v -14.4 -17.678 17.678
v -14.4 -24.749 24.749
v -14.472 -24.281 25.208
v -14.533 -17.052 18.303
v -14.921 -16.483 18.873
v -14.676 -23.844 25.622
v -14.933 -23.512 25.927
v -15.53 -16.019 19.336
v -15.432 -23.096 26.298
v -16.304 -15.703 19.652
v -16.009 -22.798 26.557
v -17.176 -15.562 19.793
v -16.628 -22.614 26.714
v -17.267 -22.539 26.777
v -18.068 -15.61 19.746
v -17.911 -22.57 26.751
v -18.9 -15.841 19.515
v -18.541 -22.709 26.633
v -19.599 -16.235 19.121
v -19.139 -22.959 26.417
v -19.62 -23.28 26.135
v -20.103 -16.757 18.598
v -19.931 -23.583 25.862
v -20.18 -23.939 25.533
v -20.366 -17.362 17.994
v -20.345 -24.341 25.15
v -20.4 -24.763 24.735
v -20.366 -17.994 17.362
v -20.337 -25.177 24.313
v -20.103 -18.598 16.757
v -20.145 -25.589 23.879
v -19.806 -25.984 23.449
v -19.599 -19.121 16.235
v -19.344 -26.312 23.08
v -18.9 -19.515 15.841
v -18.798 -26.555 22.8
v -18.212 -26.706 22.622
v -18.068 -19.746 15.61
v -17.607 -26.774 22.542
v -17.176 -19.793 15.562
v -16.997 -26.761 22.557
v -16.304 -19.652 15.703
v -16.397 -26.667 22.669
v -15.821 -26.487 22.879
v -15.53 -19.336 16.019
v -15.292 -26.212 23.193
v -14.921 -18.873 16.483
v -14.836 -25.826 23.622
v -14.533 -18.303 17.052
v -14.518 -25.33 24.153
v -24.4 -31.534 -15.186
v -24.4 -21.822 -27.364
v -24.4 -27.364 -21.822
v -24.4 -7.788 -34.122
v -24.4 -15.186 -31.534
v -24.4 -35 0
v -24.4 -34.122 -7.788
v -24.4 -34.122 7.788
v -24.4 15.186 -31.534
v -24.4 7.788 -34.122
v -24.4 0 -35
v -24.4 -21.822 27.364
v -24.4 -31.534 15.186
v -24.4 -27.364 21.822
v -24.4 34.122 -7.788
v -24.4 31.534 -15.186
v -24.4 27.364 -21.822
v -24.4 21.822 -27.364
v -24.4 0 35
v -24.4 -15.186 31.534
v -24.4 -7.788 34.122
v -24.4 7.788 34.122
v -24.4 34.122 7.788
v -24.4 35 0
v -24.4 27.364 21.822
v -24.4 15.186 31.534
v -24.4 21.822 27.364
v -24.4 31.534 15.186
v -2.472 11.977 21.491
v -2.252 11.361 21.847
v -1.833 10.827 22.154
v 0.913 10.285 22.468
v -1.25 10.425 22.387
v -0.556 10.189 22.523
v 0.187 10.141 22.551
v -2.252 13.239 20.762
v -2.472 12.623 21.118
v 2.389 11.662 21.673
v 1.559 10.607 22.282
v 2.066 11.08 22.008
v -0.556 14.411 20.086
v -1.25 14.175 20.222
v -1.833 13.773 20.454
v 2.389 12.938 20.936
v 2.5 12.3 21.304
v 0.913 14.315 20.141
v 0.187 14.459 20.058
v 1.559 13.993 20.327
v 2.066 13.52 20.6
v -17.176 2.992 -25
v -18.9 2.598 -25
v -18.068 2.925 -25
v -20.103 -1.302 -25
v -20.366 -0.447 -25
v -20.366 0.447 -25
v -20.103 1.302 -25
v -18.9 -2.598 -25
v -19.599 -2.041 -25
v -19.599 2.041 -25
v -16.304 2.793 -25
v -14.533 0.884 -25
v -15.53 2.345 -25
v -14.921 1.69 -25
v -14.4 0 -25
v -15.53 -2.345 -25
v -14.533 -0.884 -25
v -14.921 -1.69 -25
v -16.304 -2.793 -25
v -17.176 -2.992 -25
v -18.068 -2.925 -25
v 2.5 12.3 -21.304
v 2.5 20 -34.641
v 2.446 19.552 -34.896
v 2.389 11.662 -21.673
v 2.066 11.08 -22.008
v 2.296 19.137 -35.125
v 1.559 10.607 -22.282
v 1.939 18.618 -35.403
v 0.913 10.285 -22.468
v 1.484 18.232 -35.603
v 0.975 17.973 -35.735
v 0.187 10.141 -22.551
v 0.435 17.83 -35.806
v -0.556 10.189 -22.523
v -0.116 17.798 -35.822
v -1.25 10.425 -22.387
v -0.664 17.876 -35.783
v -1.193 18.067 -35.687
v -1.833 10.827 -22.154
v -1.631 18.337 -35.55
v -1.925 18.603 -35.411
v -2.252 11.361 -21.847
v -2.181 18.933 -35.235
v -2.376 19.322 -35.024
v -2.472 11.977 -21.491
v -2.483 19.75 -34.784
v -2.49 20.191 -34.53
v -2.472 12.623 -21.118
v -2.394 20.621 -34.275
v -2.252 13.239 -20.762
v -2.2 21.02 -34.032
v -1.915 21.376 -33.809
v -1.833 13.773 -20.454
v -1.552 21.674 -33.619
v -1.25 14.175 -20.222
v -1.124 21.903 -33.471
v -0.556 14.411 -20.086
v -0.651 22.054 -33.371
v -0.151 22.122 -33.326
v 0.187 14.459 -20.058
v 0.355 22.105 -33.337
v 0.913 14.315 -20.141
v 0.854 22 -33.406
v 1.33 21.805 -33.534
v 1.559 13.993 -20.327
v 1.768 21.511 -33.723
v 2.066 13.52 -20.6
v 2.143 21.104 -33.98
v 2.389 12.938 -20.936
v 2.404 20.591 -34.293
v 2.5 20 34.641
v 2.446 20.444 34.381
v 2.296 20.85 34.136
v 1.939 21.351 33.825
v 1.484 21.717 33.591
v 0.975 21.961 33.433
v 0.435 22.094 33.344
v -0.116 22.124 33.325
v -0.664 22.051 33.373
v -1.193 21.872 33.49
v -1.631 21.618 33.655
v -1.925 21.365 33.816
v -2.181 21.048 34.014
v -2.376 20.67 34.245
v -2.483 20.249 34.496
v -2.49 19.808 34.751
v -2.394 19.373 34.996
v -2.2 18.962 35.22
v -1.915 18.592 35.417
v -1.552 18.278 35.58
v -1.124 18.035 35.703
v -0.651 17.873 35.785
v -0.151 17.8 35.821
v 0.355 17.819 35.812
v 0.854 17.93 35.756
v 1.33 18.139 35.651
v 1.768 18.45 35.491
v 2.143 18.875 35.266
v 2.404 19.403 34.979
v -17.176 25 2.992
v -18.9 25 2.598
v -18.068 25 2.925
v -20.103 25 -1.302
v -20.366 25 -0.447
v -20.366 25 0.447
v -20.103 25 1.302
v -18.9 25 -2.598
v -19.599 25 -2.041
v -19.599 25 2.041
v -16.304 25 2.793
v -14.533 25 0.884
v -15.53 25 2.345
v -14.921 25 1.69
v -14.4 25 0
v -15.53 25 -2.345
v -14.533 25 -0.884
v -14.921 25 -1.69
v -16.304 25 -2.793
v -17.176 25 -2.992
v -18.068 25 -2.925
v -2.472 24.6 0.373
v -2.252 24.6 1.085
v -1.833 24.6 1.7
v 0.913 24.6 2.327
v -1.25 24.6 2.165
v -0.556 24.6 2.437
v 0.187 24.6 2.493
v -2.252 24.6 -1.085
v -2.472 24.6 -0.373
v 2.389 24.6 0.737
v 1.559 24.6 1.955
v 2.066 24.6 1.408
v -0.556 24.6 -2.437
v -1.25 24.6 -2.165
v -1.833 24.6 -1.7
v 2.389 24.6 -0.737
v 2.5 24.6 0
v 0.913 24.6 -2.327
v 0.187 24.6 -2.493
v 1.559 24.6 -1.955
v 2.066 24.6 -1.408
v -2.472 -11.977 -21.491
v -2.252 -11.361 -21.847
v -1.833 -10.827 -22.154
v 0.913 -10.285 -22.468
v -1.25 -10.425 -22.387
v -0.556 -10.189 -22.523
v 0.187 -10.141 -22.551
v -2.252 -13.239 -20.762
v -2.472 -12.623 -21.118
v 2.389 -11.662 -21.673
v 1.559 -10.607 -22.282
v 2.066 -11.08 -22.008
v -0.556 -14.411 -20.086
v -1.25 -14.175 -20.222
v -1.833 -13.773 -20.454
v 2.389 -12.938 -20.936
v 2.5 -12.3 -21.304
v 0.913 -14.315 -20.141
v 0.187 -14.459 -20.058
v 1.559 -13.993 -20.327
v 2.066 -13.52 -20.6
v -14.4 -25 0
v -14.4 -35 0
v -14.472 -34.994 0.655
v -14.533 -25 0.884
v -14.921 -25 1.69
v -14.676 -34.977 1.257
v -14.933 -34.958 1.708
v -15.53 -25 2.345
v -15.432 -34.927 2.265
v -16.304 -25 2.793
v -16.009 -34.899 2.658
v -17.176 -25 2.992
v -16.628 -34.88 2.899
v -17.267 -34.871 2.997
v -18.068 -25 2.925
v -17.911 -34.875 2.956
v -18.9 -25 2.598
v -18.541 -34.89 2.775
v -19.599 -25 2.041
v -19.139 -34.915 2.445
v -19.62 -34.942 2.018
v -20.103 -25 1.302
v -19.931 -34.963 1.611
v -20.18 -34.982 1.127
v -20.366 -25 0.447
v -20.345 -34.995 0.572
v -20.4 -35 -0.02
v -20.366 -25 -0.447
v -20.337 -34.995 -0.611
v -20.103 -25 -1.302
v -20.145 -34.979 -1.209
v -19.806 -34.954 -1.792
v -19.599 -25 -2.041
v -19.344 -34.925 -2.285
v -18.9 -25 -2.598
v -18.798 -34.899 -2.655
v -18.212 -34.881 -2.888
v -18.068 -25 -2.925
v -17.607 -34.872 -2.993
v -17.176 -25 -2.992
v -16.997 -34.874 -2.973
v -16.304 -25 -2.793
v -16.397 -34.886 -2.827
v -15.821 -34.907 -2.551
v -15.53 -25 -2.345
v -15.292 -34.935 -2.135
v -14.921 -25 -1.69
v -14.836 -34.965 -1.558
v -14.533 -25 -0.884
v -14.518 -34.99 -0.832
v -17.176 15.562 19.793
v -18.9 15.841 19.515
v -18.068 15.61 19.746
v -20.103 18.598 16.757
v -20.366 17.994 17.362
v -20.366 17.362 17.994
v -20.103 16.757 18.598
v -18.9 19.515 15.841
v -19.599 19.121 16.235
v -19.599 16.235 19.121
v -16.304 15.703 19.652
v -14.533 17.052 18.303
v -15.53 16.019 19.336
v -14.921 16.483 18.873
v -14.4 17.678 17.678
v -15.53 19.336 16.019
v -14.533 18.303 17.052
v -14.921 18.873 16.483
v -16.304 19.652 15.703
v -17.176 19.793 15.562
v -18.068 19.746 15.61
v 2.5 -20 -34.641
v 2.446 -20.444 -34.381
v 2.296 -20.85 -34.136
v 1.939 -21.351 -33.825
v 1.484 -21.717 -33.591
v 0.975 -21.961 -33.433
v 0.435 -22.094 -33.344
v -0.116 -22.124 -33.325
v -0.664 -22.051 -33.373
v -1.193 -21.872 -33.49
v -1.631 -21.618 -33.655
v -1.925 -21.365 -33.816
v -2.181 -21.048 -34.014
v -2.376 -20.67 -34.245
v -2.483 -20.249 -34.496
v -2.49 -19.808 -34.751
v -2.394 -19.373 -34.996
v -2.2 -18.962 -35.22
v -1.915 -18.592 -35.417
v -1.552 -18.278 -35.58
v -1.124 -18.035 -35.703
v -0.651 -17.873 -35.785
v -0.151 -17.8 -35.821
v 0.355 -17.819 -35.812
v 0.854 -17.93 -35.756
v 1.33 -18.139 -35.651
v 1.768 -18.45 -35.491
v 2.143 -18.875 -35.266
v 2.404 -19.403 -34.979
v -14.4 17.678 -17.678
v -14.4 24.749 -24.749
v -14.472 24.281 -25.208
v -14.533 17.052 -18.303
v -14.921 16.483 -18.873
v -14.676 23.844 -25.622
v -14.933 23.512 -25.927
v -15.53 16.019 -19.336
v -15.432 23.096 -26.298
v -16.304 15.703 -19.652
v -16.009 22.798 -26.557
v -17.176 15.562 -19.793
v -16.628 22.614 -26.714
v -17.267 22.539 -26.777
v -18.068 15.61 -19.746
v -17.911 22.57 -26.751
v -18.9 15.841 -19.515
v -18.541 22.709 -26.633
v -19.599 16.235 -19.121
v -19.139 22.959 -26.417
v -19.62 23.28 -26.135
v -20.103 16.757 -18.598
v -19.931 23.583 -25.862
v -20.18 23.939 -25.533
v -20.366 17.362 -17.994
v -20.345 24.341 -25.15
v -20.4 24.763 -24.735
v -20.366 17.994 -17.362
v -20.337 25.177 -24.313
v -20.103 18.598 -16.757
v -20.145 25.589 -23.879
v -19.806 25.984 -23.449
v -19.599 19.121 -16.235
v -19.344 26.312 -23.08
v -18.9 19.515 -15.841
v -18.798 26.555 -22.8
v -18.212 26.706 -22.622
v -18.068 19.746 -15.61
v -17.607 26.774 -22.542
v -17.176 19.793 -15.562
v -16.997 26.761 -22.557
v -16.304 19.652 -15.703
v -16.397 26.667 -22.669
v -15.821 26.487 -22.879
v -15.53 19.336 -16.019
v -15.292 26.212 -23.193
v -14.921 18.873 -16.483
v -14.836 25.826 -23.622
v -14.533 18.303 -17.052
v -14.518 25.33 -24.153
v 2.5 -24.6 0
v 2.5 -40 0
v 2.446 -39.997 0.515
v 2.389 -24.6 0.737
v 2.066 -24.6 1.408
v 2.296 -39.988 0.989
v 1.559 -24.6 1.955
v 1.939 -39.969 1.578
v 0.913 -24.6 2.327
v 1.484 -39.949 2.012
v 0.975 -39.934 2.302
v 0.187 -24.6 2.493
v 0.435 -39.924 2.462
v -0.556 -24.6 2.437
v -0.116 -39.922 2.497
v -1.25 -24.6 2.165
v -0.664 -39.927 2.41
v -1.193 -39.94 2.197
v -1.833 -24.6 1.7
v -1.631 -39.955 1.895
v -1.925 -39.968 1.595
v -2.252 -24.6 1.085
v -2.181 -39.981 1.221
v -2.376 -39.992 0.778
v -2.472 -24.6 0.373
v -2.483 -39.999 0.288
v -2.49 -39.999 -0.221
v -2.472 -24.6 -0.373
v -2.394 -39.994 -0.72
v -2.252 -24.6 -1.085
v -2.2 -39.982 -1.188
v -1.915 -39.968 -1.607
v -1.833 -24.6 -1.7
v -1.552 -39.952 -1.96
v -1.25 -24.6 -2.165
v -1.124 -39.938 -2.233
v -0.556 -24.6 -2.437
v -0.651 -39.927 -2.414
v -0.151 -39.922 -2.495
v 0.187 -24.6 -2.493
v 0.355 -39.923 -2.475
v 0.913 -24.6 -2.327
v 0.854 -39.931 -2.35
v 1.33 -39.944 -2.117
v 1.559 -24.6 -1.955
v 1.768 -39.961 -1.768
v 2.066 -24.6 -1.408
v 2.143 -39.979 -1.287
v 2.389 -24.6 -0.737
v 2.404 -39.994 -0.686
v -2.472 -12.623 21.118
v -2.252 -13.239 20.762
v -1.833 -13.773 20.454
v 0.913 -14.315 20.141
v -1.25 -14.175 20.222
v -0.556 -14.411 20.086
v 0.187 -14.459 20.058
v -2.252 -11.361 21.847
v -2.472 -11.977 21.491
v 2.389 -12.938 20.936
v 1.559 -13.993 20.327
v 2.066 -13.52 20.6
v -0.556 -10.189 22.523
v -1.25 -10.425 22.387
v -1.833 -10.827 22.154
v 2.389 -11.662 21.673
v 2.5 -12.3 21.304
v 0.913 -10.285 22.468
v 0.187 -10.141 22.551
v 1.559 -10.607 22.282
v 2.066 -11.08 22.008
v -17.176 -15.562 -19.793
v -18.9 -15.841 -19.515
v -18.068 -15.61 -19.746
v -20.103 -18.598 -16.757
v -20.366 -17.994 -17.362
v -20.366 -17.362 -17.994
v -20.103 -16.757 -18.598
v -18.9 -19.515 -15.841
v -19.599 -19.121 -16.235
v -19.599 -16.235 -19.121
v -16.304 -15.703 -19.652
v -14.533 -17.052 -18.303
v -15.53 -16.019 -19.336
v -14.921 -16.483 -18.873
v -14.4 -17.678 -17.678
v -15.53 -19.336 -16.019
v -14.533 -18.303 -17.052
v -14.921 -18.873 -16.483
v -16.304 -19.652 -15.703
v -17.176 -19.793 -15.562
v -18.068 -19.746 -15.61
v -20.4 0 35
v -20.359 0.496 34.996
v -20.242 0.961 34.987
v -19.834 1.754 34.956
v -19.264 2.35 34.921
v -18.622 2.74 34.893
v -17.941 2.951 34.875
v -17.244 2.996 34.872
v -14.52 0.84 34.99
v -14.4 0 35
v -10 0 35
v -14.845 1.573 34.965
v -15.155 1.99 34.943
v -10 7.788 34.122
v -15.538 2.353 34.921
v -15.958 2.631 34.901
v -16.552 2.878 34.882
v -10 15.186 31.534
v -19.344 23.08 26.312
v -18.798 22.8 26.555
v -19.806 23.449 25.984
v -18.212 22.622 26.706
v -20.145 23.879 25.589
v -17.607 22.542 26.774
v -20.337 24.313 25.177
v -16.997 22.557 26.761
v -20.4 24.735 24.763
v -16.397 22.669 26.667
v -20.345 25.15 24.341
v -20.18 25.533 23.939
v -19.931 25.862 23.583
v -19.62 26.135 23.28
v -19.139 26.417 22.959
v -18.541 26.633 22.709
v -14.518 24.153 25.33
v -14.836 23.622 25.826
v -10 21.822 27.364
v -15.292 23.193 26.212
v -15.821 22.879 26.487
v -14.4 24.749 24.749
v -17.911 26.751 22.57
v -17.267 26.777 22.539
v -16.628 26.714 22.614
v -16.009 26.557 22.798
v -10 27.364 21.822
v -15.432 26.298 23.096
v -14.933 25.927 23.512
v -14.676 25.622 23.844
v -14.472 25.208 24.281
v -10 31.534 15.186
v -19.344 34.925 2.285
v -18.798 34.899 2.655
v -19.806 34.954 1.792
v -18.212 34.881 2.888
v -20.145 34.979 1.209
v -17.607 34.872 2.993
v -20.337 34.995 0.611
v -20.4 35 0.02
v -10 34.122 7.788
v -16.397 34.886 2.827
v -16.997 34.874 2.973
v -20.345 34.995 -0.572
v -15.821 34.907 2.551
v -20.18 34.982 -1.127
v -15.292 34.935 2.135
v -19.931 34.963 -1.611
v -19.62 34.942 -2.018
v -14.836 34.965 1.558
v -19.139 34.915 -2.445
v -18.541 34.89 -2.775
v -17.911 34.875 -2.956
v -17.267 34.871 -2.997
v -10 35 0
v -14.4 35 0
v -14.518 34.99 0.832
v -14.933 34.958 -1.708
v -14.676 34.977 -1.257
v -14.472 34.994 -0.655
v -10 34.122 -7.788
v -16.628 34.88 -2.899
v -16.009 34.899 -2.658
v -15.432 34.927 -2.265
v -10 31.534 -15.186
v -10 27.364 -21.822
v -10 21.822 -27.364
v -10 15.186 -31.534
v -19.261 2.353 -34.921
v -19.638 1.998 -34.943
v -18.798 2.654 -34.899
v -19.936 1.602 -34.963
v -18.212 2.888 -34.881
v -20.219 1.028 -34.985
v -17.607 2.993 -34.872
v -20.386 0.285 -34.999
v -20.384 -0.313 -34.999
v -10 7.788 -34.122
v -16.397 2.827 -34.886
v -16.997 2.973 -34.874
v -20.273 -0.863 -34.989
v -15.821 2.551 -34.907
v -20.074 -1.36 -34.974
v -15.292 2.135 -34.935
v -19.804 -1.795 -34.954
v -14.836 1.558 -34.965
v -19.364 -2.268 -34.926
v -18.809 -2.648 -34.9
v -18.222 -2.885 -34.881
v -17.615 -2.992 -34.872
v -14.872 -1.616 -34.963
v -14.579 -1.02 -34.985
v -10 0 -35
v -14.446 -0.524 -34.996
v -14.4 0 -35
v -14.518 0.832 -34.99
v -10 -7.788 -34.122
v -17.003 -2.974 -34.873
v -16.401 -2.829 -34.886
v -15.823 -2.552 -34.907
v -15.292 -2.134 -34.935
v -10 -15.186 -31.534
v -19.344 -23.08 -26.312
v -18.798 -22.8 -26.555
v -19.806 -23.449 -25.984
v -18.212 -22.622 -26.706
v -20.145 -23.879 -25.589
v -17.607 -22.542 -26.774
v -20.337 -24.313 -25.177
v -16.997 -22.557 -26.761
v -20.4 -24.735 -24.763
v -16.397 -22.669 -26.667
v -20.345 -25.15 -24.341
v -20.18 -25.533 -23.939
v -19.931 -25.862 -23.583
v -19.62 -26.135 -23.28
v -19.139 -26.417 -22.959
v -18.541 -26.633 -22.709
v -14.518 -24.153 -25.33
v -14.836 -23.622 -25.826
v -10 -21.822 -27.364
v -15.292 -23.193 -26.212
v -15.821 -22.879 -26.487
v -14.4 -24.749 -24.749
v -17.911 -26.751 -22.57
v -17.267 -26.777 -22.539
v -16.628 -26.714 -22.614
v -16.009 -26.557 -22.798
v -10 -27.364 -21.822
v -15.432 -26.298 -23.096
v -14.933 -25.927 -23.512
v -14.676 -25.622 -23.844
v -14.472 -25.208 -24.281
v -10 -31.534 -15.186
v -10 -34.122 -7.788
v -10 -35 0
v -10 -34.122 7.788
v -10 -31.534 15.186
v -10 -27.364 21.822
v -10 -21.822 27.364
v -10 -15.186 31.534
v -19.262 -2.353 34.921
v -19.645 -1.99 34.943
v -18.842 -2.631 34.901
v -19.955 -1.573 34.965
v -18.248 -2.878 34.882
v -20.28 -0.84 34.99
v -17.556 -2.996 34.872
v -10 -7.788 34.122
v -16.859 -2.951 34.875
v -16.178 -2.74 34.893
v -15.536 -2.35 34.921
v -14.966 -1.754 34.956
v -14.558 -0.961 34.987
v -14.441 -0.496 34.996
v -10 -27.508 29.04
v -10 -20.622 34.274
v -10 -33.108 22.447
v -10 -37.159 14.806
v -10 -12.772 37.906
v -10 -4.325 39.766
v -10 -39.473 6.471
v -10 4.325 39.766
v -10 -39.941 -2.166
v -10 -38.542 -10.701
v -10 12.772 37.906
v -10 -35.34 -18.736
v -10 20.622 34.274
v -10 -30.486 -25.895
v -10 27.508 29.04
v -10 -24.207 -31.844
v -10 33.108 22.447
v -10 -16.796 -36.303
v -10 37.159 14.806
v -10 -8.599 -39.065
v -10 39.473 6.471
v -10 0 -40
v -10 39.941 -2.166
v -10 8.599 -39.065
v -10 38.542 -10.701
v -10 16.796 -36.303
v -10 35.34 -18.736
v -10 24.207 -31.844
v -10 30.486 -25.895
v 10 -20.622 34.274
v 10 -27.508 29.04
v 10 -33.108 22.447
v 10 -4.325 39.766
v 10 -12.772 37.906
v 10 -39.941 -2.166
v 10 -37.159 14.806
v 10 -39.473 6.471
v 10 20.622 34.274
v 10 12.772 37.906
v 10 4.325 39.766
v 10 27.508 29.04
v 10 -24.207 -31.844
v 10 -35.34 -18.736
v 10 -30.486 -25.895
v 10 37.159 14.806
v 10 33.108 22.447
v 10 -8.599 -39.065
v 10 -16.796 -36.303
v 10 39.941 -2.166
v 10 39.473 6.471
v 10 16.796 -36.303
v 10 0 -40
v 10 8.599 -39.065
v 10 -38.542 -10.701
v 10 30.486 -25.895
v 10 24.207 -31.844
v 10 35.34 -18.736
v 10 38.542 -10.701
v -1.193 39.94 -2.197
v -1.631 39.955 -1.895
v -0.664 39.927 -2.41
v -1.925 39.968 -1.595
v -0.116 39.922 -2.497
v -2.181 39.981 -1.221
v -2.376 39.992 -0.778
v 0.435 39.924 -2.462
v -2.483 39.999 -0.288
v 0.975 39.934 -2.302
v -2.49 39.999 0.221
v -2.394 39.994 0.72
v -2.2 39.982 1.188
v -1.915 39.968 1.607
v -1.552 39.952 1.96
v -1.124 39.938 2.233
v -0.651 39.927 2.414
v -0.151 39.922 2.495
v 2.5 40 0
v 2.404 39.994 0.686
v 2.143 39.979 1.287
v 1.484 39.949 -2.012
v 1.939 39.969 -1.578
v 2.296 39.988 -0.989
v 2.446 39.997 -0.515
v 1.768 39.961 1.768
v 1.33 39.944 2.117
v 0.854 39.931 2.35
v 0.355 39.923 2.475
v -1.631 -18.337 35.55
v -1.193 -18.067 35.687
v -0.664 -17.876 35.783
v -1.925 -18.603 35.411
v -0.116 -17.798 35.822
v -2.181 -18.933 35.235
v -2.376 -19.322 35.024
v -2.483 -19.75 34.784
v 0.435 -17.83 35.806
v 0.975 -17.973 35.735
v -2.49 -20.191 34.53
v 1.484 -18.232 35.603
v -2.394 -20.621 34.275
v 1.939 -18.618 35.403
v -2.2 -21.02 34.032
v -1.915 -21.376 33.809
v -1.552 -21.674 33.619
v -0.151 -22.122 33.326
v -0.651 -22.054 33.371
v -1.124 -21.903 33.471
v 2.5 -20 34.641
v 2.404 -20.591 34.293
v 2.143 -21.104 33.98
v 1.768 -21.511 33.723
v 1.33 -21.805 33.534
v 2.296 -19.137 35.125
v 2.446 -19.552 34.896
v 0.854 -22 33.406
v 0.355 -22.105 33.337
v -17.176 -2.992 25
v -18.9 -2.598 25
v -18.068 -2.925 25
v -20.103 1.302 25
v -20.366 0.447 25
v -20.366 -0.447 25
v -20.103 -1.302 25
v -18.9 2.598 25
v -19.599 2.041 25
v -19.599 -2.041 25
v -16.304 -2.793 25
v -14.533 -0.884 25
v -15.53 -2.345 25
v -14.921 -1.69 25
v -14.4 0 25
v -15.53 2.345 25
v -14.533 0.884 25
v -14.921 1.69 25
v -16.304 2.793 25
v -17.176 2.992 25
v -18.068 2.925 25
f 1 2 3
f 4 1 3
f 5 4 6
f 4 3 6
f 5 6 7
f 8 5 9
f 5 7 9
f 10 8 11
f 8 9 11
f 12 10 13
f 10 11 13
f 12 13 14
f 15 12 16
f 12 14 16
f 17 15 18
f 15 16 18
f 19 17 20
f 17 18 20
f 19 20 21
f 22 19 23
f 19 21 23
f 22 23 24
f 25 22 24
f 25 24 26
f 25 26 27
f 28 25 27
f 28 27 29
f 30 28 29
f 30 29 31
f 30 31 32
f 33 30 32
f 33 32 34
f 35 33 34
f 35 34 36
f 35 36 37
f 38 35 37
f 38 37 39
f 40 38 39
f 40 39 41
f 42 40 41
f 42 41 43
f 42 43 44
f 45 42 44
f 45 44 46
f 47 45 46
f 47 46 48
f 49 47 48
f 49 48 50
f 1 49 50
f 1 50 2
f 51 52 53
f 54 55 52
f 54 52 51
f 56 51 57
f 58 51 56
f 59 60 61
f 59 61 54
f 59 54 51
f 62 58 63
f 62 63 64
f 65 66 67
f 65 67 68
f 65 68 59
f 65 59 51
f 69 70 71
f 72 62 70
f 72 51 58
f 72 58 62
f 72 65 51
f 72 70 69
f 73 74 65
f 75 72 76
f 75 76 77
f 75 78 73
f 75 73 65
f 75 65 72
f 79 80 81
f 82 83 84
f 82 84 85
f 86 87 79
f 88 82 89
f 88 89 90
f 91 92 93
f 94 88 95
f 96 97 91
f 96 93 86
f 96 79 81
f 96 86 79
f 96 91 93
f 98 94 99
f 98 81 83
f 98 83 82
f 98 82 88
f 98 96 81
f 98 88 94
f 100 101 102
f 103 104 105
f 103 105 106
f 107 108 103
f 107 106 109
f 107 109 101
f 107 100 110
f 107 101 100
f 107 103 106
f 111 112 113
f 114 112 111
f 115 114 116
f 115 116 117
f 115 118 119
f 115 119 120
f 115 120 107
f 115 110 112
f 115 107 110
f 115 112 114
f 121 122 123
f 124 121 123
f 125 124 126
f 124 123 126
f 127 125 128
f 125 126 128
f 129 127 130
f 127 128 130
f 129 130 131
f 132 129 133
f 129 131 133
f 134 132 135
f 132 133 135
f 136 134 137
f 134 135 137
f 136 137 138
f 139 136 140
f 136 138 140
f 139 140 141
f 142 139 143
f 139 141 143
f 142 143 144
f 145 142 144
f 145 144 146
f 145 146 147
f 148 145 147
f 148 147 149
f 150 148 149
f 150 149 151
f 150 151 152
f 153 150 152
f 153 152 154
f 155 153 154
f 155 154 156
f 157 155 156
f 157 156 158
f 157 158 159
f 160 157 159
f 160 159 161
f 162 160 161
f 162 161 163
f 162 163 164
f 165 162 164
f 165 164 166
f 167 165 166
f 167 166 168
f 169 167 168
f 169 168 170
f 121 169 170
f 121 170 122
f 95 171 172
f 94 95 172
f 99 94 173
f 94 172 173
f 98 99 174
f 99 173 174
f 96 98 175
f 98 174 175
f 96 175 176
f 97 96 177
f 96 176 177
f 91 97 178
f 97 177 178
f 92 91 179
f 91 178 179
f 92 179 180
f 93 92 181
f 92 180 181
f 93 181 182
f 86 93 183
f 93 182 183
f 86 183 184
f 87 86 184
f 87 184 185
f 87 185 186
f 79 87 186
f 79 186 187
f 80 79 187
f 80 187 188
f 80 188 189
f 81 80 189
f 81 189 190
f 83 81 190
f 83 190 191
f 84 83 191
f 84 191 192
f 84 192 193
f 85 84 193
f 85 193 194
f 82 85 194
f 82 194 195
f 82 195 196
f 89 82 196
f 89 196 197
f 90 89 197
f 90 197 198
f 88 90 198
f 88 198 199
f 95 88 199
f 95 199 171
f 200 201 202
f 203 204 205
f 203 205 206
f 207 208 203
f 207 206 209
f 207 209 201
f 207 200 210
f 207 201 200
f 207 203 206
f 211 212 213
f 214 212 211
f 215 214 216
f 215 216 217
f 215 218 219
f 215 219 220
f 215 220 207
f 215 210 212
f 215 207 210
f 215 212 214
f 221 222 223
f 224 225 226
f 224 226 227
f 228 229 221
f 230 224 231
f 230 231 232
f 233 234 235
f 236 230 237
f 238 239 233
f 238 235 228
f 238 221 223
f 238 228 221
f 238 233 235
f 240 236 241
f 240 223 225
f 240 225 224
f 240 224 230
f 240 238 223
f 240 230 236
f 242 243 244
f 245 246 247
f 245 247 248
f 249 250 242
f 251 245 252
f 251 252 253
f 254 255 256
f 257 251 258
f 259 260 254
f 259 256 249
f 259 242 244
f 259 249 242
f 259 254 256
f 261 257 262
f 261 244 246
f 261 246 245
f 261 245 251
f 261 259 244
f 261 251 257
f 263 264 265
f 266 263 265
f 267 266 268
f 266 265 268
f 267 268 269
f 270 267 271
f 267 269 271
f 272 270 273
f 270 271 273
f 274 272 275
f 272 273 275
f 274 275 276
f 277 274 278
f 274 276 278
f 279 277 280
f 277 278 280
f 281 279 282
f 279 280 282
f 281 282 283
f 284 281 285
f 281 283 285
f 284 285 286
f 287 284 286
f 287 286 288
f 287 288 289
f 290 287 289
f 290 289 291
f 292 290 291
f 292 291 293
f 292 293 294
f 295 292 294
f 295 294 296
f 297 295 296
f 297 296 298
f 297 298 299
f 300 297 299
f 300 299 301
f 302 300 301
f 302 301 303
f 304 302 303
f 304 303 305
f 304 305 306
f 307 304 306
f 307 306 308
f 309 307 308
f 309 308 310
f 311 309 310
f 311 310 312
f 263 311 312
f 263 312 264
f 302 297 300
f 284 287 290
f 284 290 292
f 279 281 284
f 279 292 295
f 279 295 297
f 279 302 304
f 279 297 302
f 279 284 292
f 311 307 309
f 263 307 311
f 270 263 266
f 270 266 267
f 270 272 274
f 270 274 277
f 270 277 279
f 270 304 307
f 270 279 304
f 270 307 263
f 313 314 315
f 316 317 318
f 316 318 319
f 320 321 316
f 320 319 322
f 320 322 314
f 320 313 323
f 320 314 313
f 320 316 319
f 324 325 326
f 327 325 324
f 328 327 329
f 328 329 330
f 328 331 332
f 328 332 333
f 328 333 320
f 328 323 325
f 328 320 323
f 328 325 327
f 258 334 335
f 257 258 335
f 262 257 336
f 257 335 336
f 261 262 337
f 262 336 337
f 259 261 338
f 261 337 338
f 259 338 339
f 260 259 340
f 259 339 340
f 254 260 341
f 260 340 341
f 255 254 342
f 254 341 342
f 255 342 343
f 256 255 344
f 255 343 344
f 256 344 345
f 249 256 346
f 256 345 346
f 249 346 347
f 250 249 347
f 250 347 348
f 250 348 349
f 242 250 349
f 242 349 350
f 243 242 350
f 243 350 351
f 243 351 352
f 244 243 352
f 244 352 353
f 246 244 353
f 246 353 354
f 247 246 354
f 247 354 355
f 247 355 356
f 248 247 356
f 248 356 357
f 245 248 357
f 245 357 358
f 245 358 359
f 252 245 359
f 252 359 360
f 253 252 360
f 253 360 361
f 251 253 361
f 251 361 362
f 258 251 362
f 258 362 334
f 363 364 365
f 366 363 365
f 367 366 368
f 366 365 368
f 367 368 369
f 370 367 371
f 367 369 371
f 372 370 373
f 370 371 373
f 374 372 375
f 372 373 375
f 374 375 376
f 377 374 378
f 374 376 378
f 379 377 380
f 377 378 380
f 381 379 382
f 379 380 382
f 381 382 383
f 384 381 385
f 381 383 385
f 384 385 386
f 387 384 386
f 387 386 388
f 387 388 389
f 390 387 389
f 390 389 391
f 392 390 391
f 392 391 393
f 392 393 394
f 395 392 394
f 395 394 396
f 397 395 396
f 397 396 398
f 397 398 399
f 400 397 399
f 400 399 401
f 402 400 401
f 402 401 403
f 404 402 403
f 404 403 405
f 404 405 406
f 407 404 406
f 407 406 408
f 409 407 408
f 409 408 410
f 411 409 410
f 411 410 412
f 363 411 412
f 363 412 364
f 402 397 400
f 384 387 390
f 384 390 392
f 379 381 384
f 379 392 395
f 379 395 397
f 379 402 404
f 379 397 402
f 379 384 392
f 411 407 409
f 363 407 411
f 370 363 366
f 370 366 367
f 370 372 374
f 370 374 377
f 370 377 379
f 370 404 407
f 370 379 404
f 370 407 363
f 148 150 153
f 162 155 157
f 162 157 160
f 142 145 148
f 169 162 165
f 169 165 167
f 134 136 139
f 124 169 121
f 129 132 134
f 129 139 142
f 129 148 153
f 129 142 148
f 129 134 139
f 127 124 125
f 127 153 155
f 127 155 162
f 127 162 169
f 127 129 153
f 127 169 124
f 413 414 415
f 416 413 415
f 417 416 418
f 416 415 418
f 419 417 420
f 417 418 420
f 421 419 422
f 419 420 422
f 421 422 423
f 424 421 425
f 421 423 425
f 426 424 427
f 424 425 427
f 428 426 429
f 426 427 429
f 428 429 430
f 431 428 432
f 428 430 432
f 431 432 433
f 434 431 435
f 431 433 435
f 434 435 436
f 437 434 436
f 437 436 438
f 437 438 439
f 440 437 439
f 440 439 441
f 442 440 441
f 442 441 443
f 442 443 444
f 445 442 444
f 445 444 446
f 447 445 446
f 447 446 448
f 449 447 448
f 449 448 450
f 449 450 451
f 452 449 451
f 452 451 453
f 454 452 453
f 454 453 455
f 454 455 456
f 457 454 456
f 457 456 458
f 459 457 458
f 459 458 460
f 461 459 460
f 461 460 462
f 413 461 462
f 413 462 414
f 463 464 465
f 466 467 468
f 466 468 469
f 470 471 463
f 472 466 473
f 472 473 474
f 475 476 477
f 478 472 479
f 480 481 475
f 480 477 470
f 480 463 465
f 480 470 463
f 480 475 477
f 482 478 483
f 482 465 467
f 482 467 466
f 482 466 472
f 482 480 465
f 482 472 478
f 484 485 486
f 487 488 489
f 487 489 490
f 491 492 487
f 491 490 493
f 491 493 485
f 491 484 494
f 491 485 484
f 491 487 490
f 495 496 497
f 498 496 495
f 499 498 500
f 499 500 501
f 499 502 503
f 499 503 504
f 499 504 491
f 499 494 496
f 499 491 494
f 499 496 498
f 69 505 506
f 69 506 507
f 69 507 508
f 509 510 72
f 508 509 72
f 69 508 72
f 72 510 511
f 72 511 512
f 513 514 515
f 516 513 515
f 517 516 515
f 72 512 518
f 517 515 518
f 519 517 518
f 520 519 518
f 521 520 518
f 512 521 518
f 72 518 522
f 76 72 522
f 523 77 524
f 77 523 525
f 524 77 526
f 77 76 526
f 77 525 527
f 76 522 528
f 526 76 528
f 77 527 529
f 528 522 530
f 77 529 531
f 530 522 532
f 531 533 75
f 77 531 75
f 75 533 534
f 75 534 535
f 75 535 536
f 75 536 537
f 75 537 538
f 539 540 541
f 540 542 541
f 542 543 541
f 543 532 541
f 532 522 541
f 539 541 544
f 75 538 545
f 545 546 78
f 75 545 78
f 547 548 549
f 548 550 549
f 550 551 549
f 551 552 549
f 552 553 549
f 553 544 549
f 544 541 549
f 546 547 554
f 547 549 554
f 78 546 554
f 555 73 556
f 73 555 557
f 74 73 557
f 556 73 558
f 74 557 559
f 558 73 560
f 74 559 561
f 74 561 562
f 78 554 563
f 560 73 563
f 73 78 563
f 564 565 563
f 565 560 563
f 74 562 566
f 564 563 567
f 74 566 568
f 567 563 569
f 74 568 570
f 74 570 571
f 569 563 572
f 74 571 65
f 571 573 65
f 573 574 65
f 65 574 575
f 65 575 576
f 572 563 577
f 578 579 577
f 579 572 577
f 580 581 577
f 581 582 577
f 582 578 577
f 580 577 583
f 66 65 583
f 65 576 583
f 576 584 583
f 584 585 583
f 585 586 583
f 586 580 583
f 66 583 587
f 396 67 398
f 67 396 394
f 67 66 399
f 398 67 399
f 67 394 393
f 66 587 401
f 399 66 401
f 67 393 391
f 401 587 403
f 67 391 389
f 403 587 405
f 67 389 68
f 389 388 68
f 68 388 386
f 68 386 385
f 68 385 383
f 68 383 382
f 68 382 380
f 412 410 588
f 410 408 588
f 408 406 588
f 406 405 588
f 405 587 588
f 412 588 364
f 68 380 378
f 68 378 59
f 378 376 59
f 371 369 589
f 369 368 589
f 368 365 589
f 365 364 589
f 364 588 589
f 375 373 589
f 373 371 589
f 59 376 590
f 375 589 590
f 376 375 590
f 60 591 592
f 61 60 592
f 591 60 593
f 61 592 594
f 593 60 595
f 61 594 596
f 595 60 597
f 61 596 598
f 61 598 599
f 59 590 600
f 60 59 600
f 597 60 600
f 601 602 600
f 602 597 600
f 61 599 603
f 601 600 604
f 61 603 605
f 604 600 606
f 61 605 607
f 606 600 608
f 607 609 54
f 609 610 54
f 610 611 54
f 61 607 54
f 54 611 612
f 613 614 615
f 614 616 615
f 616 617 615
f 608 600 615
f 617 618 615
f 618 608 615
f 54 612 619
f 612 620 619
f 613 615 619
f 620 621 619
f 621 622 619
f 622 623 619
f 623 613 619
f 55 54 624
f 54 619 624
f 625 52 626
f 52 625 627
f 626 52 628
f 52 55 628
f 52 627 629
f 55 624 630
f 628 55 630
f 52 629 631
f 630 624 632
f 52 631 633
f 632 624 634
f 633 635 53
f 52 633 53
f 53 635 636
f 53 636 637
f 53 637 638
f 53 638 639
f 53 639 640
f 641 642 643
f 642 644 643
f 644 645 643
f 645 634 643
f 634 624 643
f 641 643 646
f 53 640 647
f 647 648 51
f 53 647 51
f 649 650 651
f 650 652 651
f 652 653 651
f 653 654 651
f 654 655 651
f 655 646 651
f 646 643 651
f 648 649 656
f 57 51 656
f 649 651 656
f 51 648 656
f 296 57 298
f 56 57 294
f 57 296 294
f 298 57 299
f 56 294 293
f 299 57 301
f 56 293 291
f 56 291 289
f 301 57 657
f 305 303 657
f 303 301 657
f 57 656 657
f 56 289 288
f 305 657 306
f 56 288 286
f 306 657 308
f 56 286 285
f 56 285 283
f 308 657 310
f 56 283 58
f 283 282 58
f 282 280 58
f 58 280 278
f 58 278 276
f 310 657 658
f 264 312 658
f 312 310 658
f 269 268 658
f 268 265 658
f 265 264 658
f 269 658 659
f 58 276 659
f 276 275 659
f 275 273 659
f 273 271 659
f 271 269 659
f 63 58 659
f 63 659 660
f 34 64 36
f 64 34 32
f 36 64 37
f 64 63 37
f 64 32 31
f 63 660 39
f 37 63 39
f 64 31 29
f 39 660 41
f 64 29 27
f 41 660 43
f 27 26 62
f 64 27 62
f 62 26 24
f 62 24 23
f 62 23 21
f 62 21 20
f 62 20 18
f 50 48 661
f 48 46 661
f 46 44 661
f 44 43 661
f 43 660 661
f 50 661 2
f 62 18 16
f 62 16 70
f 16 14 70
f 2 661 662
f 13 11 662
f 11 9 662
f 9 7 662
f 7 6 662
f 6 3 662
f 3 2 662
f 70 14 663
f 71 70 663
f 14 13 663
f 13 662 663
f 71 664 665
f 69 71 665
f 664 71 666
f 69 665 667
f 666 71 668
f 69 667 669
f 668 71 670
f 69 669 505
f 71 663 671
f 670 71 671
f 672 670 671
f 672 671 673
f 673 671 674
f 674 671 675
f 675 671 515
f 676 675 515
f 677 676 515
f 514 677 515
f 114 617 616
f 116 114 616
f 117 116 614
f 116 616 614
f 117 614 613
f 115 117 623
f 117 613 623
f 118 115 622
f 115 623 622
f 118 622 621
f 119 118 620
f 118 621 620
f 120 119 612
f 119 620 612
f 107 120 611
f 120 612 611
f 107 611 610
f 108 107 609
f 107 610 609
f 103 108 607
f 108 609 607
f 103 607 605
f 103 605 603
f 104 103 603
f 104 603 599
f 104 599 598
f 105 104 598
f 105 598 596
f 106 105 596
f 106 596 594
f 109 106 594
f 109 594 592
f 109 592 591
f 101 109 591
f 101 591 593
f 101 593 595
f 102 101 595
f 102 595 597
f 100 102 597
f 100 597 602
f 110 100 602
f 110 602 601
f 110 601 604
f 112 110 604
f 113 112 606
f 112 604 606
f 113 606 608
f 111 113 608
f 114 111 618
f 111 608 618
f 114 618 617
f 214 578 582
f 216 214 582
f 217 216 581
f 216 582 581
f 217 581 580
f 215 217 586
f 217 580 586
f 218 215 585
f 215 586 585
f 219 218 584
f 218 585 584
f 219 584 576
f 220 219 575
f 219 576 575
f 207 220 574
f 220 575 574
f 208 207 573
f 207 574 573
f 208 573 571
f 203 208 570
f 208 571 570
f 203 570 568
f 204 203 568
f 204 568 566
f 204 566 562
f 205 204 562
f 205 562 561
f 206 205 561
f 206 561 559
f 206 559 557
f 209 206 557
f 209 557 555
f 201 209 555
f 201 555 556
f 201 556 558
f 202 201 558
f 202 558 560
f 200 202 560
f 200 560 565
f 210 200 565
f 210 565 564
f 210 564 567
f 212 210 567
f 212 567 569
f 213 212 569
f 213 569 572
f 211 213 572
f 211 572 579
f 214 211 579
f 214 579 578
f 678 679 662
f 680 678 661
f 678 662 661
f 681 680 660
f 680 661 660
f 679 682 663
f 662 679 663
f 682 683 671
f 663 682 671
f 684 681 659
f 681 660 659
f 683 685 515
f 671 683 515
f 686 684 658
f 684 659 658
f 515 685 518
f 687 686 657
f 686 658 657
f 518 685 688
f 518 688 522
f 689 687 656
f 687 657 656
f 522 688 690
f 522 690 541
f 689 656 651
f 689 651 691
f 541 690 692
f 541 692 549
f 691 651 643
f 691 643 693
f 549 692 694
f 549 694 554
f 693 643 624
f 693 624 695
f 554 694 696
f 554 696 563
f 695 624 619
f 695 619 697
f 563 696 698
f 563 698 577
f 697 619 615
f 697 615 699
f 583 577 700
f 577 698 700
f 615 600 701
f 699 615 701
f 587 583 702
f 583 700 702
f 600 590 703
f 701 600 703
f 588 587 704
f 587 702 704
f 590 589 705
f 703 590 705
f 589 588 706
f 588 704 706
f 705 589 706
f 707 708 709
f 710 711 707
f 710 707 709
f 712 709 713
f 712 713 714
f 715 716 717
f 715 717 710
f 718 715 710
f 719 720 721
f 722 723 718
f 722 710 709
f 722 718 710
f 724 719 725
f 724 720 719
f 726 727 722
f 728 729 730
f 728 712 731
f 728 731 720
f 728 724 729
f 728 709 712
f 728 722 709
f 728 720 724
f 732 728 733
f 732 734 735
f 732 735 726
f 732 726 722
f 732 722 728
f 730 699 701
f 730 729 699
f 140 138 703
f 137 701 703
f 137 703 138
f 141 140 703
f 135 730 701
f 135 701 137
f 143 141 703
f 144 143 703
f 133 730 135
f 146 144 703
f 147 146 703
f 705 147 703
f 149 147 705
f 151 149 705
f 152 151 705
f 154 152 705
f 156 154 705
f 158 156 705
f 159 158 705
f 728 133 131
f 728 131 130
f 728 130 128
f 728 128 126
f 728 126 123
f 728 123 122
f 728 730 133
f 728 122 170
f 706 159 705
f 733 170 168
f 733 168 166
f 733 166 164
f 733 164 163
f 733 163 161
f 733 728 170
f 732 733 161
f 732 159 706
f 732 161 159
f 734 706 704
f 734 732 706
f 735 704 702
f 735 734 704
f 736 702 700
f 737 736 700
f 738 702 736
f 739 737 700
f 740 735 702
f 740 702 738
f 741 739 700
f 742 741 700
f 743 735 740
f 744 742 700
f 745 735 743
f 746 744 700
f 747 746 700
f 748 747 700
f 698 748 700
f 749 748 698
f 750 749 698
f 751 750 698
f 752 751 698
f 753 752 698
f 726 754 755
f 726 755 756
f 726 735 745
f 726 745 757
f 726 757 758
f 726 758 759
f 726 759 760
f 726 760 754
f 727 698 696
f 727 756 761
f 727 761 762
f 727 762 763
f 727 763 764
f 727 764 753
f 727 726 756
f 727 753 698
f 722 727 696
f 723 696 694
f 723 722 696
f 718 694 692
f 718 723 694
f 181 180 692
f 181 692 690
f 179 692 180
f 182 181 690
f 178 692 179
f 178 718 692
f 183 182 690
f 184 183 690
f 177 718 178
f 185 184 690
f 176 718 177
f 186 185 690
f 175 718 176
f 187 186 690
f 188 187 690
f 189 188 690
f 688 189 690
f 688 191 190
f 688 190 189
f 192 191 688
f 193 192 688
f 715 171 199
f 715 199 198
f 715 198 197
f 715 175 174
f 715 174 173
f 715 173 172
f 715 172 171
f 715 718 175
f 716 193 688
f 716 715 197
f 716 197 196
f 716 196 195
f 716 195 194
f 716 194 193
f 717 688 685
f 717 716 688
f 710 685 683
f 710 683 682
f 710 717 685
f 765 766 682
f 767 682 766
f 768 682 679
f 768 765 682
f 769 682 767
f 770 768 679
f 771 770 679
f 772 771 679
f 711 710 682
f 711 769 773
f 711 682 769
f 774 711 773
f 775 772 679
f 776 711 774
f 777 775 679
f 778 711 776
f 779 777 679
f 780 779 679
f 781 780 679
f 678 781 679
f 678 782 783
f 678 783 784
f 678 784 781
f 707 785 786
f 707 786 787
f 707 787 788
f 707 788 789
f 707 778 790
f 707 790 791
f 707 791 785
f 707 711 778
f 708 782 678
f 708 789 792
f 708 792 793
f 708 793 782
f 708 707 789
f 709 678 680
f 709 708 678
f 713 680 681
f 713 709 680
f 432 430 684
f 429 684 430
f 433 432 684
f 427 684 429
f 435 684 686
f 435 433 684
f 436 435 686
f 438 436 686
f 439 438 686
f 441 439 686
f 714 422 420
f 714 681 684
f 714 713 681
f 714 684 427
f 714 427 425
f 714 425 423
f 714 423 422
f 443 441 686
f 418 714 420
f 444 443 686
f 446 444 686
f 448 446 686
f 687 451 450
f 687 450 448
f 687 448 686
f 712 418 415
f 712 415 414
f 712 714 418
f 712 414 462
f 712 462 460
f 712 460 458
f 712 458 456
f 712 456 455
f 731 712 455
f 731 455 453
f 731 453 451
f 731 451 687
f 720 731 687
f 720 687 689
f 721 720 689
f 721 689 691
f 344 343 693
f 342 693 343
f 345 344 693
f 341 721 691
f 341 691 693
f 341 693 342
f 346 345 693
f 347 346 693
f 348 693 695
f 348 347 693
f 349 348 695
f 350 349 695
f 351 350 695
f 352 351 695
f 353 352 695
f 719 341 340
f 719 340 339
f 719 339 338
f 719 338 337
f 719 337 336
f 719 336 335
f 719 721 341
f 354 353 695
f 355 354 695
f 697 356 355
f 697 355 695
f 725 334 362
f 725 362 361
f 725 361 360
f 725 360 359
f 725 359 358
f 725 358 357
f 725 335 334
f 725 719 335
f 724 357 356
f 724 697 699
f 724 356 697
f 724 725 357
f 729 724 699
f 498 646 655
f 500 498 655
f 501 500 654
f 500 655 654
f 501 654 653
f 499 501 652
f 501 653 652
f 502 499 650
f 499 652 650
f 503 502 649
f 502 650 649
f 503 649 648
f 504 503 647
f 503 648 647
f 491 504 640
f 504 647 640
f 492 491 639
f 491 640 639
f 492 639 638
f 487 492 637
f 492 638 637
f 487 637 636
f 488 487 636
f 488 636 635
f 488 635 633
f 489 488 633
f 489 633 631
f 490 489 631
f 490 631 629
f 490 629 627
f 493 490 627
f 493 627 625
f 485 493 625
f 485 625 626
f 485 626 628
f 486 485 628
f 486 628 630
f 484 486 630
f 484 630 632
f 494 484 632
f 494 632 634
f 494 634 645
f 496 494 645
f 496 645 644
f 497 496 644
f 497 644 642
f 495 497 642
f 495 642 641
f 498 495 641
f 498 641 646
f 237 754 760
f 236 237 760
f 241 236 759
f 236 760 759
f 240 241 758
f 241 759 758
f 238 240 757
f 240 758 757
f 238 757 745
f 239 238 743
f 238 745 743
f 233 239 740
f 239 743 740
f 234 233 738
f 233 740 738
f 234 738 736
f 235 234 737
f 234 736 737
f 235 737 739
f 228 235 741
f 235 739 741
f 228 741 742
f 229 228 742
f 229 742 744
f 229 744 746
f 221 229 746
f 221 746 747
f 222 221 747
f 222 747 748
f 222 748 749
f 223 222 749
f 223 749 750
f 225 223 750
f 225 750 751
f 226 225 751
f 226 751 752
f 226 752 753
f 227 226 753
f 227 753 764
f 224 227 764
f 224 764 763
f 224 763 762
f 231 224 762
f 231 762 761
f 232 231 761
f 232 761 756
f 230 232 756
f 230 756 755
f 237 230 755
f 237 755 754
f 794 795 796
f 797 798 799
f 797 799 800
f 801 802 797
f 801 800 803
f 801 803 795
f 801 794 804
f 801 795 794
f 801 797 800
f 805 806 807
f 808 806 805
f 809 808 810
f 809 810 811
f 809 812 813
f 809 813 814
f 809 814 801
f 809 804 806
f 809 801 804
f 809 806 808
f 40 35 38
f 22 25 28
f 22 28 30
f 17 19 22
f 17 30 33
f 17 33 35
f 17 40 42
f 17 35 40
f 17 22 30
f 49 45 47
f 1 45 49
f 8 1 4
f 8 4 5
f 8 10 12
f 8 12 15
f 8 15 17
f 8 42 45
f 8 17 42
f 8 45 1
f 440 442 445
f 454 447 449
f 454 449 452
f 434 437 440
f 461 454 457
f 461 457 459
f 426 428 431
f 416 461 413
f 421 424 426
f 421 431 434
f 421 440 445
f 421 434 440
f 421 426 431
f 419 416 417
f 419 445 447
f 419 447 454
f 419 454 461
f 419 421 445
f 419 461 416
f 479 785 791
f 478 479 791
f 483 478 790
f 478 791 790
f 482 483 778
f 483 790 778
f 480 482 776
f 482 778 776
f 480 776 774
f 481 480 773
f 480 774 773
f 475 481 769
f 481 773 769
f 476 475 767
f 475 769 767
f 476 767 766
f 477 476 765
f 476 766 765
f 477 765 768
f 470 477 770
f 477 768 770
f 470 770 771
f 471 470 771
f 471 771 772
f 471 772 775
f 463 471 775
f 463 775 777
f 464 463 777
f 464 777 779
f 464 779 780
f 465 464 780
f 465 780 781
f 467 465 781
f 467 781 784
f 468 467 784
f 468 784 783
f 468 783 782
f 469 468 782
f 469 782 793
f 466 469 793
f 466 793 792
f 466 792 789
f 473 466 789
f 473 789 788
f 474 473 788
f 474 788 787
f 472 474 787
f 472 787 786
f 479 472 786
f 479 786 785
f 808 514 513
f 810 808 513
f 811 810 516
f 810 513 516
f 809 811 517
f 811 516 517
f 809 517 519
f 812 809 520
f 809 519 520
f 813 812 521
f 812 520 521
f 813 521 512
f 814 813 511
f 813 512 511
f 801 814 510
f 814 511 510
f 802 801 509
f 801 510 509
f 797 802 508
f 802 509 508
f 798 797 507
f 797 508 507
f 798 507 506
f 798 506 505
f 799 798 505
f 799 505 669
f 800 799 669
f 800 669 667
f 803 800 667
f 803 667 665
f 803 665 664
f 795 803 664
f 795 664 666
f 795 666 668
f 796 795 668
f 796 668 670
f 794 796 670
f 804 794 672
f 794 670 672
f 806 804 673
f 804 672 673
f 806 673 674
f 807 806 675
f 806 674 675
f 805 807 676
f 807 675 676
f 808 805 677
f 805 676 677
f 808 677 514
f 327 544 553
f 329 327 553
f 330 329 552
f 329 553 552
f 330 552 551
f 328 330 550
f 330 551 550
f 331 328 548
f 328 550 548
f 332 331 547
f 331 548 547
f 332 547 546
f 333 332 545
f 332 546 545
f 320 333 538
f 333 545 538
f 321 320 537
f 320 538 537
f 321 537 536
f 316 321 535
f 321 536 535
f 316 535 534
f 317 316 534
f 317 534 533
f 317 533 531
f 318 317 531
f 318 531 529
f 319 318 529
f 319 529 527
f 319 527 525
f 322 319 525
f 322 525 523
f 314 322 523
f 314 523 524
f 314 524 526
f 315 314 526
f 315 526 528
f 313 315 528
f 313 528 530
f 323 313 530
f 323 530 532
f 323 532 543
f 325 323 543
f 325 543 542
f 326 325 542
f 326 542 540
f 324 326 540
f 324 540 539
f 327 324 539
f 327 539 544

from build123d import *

# Parameters (mm, degrees)
SKETCH1_R           = 40
BOSS_EXTRUDE2_DEPTH = 10
SKETCH4_R           = 2.5
CUT_EXTRUDE3_DEPTH  = 15.4
CIRPATTERN1_COUNT   = 6
SKETCH3_R           = 35
BOSS_EXTRUDE4_DEPTH = 14.4
SKETCH8_R           = 3
CUT_EXTRUDE4_DEPTH  = 10
CIRPATTERN2_COUNT   = 8


with BuildPart() as part:
    # Sketch1 → Boss-Extrude2 (new body, symmetric)
    with BuildSketch(Plane(origin=(0, 0, 0), x_dir=(0, 0, -1), z_dir=(1, 0, 0))):
        Circle(SKETCH1_R)
    extrude(amount=BOSS_EXTRUDE2_DEPTH, both=True)

    # Sketch4 → Cut-Extrude3 (cut)
    with BuildSketch(Plane(origin=(0, 40, 0), x_dir=(1, 0, 0), z_dir=(0, 1, 0))):
        Circle(SKETCH4_R)
    cut_extrude3 = extrude(amount=-CUT_EXTRUDE3_DEPTH, mode=Mode.SUBTRACT)

    # CirPattern1: Cut-Extrude3 ×6 about axis
    cirpattern1_axis = Axis((0, 0, 0), (1, 0, 0))
    for i in range(1, CIRPATTERN1_COUNT):
        add(cut_extrude3.rotate(cirpattern1_axis, i * 360 / CIRPATTERN1_COUNT), mode=Mode.SUBTRACT)

    # Sketch3 → Boss-Extrude4 (add)
    with BuildSketch(Plane.ZY.offset(10)):
        Circle(SKETCH3_R)
    extrude(amount=BOSS_EXTRUDE4_DEPTH)

    # Sketch8 → Cut-Extrude4 (cut)
    with BuildSketch(Plane(origin=(0, 35, 0), x_dir=(1, 0, 0), z_dir=(0, 1, 0))):
        with Locations((-17.4, 0)):
            Circle(SKETCH8_R)
    cut_extrude4 = extrude(amount=-CUT_EXTRUDE4_DEPTH, mode=Mode.SUBTRACT)

    # CirPattern2: Cut-Extrude4 ×8 about axis
    cirpattern2_axis = Axis((0, 0, 0), (1, 0, 0))
    for i in range(1, CIRPATTERN2_COUNT):
        add(cut_extrude4.rotate(cirpattern2_axis, i * 360 / CIRPATTERN2_COUNT), mode=Mode.SUBTRACT)


solid = part.part
